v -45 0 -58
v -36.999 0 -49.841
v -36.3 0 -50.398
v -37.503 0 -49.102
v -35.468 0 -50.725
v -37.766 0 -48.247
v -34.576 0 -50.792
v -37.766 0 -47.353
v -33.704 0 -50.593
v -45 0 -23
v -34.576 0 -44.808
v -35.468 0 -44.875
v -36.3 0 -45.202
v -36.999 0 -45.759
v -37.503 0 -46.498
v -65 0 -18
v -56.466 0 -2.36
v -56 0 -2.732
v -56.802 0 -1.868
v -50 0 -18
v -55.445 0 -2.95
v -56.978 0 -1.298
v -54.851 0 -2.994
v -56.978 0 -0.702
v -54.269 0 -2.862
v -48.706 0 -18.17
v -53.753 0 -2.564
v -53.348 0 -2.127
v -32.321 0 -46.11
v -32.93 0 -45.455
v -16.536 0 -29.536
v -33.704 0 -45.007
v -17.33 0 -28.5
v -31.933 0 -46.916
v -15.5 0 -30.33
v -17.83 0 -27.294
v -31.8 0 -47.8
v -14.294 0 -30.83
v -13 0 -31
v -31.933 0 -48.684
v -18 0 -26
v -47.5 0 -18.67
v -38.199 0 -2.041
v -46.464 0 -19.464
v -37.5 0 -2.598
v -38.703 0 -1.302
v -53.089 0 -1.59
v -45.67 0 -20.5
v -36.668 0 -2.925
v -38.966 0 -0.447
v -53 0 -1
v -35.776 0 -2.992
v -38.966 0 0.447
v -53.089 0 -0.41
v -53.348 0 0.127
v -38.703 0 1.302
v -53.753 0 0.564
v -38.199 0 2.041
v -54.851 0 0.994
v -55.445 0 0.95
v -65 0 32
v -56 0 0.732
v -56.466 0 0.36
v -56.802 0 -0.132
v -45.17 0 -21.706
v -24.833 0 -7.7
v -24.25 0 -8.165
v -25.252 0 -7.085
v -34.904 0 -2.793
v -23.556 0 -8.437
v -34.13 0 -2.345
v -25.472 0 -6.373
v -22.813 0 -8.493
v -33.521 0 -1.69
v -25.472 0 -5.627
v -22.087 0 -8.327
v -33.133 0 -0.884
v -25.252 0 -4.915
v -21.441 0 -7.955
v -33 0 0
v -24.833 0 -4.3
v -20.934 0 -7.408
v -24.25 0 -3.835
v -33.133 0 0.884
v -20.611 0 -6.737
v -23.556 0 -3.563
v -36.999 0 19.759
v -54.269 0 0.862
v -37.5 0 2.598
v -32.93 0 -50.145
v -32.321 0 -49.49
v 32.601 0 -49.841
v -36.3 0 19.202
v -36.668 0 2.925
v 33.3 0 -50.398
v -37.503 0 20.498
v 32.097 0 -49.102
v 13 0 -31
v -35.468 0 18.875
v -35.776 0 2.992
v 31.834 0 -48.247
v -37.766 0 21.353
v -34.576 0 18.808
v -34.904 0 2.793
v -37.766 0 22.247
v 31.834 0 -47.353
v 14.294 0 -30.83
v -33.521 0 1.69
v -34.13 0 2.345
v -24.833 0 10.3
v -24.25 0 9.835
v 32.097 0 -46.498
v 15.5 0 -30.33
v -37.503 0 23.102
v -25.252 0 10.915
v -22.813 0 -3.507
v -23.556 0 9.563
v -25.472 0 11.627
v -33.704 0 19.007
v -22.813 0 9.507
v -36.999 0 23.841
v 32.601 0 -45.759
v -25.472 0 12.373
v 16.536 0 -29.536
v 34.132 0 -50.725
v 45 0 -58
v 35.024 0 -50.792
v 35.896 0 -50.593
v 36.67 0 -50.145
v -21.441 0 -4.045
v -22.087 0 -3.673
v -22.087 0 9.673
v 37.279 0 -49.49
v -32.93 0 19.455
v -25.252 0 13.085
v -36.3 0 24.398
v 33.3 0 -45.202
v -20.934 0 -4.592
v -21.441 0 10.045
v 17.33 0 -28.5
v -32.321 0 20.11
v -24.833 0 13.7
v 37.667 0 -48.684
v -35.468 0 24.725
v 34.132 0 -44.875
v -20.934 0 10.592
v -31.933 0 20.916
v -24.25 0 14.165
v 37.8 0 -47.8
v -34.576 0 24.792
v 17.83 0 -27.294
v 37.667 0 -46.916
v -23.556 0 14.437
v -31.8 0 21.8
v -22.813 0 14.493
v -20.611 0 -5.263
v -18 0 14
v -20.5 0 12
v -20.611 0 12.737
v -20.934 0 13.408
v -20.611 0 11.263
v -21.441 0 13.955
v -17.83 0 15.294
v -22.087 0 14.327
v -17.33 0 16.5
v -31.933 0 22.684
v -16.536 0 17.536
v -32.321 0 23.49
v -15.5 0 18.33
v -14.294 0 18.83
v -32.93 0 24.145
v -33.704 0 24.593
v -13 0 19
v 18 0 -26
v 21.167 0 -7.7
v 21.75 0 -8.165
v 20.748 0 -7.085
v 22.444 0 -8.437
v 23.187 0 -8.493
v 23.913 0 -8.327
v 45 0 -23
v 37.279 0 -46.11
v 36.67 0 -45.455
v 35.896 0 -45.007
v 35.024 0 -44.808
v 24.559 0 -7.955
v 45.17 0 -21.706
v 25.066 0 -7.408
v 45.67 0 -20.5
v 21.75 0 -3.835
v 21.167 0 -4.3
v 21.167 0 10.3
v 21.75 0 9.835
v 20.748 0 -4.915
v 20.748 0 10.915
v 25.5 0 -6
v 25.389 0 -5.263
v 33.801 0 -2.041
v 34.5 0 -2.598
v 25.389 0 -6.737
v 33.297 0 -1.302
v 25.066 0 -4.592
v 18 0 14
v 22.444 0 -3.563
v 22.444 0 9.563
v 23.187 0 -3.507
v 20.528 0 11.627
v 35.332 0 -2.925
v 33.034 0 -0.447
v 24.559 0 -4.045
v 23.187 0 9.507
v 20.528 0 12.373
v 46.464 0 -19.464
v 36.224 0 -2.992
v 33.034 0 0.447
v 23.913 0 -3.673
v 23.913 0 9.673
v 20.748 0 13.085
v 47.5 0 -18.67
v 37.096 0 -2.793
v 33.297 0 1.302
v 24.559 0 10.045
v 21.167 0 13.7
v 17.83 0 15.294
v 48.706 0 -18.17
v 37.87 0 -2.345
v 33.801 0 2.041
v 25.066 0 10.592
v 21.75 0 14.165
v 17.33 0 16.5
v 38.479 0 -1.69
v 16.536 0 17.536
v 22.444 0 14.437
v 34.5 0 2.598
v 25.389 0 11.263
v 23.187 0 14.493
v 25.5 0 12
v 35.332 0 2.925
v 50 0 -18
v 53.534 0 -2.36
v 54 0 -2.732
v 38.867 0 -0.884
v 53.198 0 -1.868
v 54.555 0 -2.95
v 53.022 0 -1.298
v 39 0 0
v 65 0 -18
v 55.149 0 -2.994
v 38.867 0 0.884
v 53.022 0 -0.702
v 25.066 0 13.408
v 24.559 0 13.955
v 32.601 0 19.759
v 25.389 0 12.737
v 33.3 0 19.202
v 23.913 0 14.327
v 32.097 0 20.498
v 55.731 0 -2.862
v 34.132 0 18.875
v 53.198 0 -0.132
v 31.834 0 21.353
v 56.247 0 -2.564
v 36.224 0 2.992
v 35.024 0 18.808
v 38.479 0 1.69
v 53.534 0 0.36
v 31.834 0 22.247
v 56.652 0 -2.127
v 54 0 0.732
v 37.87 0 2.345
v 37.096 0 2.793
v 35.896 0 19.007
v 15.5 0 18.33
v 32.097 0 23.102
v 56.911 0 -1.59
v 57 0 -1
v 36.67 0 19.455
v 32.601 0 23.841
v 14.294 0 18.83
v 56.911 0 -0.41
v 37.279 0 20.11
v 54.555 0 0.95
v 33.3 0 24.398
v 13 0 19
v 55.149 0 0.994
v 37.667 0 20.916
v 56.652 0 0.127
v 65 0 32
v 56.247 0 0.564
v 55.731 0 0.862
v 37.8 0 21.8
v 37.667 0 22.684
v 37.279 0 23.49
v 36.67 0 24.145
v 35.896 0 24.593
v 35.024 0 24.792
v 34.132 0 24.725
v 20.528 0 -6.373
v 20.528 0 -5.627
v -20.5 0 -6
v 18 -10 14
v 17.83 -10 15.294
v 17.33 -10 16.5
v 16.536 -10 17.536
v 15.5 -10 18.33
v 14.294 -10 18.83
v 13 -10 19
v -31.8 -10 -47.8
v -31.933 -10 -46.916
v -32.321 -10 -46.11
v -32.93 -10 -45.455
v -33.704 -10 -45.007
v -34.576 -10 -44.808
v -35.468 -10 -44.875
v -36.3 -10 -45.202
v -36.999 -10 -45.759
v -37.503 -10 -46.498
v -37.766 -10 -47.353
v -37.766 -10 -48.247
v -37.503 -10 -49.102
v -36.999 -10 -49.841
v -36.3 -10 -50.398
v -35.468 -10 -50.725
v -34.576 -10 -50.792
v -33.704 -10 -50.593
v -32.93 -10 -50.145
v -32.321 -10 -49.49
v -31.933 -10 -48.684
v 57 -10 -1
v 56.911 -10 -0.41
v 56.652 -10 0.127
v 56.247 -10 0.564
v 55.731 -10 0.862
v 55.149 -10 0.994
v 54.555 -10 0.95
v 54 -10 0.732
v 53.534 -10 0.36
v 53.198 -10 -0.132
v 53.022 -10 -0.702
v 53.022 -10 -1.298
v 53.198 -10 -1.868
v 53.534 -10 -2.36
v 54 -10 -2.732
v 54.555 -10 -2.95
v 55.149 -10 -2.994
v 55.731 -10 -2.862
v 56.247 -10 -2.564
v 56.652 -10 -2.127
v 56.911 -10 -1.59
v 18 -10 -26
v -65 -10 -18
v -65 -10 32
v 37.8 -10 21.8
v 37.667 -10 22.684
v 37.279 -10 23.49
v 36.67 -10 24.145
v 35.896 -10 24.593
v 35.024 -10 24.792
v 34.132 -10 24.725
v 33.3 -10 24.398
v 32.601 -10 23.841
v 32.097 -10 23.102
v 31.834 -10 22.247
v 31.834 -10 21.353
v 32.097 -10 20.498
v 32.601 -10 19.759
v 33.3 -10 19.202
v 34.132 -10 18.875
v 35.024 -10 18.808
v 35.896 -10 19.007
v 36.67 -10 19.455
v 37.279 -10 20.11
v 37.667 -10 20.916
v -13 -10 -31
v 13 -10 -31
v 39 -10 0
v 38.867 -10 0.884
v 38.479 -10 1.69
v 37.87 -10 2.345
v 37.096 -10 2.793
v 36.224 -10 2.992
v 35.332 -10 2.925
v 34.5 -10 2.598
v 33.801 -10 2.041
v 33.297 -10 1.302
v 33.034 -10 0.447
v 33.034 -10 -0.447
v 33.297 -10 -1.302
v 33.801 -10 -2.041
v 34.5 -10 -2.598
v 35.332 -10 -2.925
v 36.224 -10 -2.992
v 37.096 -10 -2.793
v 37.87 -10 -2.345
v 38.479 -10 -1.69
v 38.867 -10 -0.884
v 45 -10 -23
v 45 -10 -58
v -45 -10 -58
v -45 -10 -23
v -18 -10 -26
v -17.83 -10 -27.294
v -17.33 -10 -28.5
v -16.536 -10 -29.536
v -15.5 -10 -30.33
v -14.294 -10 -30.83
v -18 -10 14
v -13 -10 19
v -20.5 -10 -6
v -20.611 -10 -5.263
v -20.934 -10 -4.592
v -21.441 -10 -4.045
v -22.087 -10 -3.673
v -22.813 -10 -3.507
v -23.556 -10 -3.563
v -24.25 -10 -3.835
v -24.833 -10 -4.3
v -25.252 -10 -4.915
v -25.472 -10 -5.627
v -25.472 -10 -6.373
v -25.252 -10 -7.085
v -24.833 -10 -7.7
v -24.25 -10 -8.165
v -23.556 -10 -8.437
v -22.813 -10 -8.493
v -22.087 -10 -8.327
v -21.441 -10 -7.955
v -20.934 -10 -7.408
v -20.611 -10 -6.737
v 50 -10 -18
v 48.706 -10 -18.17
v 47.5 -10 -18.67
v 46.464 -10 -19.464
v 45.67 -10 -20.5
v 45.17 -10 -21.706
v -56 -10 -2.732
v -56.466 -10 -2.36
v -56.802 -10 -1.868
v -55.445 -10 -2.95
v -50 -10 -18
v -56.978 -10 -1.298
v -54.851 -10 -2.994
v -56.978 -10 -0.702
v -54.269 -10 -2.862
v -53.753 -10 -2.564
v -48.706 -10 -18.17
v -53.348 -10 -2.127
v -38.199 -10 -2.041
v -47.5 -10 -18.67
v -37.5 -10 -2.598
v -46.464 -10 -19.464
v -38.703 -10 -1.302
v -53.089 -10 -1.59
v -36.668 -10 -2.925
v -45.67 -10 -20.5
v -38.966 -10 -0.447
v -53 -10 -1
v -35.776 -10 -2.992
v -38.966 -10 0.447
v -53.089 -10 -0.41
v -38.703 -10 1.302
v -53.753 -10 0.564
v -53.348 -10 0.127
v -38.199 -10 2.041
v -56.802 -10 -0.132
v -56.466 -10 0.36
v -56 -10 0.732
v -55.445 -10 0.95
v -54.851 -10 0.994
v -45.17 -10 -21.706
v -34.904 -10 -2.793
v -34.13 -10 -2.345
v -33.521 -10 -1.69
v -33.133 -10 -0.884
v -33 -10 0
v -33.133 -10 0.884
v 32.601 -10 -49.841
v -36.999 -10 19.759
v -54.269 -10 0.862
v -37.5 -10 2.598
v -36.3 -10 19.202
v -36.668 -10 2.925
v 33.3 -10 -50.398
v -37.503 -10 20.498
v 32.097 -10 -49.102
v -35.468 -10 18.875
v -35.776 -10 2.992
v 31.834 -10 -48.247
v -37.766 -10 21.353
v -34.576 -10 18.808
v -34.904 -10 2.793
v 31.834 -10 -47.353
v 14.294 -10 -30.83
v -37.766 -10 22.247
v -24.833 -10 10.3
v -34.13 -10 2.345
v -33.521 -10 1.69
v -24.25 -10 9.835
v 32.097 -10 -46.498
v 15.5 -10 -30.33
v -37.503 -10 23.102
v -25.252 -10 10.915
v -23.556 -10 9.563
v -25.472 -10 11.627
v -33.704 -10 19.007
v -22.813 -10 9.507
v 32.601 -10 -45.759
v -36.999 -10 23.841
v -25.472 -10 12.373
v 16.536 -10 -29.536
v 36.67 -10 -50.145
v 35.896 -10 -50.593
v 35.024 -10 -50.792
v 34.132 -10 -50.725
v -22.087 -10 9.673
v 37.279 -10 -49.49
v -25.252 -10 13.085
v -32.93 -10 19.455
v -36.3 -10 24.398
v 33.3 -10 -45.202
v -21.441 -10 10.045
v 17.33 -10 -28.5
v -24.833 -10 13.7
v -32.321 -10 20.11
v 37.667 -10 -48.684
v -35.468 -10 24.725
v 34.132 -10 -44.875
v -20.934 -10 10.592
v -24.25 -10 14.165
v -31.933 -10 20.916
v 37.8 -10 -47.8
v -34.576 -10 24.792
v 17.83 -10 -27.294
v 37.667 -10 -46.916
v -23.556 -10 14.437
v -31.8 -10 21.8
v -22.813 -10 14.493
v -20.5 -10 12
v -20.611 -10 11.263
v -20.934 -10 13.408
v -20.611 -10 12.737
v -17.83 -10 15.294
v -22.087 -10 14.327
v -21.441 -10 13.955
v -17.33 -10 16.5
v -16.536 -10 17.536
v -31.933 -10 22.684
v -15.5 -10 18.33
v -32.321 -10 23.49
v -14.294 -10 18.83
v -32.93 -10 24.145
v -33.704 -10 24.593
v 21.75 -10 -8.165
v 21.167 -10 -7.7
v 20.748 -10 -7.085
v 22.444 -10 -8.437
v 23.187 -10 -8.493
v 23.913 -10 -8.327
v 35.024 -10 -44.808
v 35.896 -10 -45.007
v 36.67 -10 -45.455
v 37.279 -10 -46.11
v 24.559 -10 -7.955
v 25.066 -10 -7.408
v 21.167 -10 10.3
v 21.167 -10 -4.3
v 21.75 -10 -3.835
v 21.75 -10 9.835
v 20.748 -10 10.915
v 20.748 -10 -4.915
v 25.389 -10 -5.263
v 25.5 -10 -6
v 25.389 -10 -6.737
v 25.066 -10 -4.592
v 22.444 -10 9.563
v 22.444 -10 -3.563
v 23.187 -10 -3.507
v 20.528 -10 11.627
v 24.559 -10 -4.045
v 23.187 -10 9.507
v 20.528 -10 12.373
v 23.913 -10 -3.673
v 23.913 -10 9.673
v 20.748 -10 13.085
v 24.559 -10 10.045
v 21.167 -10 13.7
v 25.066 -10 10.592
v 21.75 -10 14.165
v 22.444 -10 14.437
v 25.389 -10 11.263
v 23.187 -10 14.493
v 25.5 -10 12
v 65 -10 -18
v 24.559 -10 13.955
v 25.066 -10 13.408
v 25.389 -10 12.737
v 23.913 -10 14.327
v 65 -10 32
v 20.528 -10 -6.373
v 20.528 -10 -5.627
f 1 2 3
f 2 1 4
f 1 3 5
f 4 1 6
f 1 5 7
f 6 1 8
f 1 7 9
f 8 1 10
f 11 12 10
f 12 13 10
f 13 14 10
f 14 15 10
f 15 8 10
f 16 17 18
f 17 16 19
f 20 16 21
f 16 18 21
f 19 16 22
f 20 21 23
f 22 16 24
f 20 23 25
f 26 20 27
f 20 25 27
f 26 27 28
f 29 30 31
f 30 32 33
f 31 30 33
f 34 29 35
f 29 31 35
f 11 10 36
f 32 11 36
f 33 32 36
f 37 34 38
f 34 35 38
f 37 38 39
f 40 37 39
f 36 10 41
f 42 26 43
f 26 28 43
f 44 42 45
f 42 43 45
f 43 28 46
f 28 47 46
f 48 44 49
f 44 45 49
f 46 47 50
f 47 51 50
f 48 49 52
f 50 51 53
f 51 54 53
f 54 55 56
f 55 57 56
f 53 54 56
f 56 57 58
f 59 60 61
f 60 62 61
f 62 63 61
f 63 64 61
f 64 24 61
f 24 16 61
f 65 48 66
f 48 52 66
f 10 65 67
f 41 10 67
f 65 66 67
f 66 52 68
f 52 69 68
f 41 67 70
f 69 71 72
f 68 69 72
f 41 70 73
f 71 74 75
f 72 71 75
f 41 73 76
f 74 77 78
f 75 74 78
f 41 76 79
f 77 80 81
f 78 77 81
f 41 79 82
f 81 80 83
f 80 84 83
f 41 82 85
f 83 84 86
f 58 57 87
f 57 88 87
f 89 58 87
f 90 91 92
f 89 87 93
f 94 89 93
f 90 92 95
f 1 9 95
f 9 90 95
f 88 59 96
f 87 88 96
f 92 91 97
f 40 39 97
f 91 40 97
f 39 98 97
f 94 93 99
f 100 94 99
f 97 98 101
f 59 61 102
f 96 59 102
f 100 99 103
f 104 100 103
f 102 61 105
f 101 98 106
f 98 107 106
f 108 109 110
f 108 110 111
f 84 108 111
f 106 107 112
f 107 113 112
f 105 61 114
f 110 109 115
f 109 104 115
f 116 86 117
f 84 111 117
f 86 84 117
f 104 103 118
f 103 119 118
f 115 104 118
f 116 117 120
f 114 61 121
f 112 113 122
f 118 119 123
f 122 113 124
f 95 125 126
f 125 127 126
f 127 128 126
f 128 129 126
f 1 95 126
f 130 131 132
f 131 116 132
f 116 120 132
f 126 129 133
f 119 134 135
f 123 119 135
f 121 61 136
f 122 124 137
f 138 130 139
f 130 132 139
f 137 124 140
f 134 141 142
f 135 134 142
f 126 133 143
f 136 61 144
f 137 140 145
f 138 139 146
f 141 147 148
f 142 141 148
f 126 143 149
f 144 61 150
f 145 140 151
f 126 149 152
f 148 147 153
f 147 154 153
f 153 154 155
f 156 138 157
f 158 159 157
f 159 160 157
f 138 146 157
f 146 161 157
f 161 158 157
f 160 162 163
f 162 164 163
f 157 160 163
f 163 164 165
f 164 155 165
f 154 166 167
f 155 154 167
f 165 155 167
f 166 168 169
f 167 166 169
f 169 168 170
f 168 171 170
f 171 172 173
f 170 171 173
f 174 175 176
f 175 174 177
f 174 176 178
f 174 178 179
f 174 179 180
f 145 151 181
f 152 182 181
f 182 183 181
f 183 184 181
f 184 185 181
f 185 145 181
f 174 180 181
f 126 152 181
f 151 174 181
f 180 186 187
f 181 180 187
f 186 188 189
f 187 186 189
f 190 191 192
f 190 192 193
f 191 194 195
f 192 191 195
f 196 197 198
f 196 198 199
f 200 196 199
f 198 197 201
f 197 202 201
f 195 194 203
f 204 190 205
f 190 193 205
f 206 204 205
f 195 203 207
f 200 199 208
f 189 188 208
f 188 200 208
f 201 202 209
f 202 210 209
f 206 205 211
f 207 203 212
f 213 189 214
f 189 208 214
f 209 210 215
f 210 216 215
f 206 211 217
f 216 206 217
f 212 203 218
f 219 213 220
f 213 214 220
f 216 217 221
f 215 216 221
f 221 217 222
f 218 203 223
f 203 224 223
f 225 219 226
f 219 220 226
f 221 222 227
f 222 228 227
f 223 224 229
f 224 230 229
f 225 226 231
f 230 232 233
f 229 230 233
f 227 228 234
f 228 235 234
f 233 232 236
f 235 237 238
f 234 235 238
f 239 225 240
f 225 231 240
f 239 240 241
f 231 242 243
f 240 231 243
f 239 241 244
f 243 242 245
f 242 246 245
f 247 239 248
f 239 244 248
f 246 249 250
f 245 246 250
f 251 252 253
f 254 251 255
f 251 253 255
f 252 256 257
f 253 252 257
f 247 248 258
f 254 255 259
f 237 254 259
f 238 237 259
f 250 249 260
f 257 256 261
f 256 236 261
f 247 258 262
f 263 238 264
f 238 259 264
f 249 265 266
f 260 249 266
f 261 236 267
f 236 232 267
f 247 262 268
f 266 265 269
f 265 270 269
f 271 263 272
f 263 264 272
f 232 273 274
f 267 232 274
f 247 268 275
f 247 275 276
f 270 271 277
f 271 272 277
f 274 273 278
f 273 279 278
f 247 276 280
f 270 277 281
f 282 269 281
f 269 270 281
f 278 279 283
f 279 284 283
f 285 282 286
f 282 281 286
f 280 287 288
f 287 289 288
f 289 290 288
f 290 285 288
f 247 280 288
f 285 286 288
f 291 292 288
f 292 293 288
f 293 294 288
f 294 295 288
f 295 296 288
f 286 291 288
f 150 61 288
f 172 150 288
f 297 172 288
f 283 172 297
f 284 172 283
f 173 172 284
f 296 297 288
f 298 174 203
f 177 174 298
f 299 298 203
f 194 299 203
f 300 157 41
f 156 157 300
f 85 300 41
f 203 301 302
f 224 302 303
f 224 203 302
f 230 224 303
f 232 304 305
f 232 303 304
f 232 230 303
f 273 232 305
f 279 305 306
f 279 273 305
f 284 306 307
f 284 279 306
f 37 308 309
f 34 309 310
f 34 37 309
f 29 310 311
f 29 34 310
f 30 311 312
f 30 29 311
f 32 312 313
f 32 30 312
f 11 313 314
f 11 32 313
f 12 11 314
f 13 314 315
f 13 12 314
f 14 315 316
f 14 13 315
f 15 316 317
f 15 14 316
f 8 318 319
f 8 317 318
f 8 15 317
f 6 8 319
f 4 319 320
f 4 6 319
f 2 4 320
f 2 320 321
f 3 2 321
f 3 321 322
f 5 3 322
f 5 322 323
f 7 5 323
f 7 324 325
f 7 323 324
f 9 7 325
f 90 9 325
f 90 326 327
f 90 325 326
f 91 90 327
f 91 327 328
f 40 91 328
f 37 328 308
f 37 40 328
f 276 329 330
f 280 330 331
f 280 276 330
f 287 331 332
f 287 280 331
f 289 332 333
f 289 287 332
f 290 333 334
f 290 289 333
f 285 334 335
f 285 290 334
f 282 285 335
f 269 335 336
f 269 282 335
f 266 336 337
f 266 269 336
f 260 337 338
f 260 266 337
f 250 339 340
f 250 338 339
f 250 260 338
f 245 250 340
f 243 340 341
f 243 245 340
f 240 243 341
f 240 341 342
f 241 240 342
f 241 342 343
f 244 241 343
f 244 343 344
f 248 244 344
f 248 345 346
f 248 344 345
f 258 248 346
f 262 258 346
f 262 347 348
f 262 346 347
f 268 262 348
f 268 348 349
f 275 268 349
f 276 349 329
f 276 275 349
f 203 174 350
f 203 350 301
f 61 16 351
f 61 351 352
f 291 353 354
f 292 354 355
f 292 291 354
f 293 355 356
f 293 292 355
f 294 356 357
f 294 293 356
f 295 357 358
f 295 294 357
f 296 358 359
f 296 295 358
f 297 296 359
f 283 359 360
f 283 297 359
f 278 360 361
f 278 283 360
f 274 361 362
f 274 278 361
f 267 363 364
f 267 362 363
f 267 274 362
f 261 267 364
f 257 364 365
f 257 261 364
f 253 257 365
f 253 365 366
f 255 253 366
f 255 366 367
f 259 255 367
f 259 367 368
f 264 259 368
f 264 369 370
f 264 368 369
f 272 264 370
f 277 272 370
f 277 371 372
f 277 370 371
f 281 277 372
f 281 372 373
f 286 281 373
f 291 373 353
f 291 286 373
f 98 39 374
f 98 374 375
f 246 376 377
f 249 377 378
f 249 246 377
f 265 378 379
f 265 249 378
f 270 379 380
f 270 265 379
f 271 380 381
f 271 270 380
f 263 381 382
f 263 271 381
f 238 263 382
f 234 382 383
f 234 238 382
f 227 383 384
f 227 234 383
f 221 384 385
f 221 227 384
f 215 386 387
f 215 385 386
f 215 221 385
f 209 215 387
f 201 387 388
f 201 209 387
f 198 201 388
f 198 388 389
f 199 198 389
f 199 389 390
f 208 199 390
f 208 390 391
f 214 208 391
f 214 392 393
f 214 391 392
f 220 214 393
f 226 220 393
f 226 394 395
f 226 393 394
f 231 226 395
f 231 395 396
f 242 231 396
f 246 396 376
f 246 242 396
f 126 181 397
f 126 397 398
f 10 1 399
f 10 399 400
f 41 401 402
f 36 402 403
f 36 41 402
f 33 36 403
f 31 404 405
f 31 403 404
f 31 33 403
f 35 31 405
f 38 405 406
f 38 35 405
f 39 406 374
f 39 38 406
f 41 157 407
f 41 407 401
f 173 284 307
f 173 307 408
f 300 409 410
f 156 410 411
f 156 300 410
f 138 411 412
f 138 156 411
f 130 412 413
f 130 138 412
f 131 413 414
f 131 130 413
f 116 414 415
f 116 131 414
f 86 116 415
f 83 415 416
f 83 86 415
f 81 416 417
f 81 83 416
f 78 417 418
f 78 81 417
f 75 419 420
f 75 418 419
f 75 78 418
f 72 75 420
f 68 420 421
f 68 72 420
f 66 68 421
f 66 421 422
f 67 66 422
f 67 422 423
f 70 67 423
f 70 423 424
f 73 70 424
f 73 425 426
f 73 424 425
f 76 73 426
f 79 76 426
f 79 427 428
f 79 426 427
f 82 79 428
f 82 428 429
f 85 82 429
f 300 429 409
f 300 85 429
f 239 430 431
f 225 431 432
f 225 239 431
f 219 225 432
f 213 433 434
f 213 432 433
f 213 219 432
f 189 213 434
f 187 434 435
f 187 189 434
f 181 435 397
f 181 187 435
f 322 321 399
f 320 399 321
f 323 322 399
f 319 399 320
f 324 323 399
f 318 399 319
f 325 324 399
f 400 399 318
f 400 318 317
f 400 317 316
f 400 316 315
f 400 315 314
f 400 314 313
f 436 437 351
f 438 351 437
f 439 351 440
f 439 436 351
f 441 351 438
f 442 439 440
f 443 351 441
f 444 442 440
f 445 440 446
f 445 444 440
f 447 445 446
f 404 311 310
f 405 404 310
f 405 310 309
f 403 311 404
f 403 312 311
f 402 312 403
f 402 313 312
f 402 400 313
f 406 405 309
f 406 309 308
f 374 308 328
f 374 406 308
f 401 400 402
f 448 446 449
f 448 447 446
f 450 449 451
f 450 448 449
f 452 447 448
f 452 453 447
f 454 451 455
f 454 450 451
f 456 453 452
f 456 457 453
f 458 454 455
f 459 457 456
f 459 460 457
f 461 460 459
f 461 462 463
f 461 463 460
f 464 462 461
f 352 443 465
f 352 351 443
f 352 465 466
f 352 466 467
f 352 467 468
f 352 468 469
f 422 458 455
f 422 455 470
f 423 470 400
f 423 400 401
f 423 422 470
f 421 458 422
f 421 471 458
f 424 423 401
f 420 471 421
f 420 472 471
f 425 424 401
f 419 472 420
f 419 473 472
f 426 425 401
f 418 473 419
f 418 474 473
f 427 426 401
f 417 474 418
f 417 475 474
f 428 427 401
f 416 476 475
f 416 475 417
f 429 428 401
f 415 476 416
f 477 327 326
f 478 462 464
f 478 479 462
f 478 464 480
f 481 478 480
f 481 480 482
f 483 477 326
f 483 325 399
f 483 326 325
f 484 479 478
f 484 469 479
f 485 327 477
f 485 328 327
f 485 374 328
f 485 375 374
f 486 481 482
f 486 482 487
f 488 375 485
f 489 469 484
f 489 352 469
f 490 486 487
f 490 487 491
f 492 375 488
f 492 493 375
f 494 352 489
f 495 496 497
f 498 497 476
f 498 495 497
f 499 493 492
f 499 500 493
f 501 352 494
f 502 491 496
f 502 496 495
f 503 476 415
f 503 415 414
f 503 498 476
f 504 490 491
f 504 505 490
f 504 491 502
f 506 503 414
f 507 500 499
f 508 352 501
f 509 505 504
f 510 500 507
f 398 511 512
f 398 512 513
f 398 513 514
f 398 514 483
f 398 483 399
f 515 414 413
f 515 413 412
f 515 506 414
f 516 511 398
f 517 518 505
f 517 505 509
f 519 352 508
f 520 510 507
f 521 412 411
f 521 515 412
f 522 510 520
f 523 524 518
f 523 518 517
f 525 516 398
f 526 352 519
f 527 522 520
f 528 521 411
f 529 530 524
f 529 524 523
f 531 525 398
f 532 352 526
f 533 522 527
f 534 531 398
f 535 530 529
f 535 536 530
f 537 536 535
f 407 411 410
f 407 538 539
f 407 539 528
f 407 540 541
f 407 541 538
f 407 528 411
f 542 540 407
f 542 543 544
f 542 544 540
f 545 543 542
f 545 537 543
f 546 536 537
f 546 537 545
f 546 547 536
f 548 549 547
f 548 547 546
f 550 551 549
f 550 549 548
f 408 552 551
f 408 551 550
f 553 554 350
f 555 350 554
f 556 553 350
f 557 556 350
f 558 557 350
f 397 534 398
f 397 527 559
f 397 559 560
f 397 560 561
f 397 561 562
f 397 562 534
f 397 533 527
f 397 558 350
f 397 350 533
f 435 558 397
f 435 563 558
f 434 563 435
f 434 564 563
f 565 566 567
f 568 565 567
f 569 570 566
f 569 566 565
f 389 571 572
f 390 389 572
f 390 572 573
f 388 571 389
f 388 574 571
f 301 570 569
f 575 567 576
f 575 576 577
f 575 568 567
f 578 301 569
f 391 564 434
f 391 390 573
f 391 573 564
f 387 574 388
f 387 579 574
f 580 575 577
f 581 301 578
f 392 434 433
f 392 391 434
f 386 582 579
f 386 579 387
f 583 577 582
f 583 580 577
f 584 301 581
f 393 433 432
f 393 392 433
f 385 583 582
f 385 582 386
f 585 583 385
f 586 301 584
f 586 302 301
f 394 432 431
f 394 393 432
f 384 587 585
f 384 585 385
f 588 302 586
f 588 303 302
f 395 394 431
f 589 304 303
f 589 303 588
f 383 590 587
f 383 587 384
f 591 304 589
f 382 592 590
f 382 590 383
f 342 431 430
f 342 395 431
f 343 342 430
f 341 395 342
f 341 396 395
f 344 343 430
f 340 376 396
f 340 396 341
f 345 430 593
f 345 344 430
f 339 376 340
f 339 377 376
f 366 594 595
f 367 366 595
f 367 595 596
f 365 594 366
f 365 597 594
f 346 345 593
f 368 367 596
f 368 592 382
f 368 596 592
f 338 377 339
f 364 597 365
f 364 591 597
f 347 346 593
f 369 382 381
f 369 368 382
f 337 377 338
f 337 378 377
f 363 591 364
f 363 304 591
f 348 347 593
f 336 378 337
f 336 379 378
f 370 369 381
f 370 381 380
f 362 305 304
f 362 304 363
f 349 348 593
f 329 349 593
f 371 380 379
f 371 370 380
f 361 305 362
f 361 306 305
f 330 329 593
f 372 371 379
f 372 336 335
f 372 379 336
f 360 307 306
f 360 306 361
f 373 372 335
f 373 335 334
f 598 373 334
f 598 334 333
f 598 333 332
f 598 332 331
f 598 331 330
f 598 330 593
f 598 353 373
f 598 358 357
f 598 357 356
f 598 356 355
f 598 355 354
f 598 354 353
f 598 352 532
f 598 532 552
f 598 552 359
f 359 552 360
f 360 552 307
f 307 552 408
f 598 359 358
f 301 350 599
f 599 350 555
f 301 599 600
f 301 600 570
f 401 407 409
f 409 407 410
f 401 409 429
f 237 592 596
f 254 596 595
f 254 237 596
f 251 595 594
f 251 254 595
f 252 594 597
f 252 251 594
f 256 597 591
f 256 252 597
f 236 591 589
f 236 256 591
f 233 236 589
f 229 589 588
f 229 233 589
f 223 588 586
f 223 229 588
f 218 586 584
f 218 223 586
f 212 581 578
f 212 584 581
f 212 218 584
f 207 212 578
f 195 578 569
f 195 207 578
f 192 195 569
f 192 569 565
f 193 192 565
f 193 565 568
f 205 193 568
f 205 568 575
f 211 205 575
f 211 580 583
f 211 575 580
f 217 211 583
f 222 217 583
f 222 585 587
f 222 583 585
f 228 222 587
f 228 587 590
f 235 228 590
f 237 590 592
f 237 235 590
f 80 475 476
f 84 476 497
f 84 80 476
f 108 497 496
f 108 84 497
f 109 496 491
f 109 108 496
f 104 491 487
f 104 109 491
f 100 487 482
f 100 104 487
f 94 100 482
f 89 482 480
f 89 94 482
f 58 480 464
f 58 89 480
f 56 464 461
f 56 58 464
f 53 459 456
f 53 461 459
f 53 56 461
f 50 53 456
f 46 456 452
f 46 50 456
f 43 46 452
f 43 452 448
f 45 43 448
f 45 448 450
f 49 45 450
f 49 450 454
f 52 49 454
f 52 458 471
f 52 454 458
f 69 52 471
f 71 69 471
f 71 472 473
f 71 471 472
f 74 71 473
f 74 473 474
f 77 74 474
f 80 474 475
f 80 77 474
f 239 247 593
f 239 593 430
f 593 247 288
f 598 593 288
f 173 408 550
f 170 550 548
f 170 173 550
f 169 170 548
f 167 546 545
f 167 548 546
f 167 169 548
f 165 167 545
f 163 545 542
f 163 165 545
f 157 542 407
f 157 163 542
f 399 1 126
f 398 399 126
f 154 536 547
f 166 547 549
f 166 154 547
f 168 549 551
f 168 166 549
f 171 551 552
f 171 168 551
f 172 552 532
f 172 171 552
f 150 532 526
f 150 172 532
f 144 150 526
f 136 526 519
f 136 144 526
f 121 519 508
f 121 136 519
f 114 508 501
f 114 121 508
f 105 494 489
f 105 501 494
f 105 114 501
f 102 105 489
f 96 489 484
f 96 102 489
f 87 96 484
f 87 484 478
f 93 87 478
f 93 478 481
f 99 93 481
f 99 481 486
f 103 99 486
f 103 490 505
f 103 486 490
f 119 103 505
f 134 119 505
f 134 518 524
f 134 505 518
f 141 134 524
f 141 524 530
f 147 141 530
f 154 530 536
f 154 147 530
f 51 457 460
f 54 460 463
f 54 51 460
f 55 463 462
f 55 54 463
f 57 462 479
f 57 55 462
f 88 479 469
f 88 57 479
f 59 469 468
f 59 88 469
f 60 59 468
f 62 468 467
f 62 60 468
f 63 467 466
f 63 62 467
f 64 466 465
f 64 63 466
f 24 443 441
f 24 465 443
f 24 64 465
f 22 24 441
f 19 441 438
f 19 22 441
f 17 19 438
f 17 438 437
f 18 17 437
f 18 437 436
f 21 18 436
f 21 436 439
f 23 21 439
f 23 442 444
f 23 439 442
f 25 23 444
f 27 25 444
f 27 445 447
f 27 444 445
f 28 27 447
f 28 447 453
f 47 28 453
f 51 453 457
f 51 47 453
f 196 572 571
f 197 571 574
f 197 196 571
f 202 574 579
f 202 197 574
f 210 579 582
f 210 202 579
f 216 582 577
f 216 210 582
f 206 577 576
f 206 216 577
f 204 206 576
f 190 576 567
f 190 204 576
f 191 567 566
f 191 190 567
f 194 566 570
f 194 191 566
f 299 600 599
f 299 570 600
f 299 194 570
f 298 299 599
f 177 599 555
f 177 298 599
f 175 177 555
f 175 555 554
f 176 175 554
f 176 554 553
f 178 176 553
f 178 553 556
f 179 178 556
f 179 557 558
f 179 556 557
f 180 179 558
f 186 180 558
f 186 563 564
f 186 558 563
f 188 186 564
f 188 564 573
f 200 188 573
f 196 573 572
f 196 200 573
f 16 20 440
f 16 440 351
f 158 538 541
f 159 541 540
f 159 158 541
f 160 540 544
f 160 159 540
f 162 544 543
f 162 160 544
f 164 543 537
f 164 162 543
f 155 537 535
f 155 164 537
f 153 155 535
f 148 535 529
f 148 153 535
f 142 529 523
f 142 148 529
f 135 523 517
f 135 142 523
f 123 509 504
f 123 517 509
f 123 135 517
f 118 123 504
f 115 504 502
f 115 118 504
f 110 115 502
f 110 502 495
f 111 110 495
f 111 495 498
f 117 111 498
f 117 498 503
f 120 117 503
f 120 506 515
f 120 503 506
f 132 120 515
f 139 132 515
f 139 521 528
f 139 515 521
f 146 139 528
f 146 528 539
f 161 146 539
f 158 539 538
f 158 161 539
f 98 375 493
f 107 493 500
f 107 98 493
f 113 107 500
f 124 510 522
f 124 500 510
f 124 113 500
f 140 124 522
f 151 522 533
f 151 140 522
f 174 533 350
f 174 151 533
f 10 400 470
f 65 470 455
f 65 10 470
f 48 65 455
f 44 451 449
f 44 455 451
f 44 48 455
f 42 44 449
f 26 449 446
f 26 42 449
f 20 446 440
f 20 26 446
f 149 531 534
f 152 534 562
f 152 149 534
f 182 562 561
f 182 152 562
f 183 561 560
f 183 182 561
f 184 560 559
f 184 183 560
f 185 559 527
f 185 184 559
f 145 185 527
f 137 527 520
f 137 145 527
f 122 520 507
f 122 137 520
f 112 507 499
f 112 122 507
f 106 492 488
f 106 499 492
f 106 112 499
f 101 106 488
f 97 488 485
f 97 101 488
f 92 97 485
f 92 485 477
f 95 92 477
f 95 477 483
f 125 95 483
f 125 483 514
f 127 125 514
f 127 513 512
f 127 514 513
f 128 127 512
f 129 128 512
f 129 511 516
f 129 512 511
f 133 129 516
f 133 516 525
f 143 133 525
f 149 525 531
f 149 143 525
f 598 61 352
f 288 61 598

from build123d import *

# Parameters (mm, degrees)
F1_W     = 130
F1_H     = 90
F3_DEPTH = 10
F2_R     = 2.5
F4_DEPTH = 10.001
F0_R     = 3
F0_R_2   = 2
F5_DEPTH = 10.001
F6_R     = 3
F7_DEPTH = 10.001
F9_DEPTH = 10.001


with BuildPart() as f3:
    # F1 (on Front) → F3 (new body)
    with BuildSketch(Plane.XZ):
        with Locations((0, -13)):
            Rectangle(F1_W, F1_H)
    extrude(amount=F3_DEPTH)

    # F2 (on Front) → F4 (cut, through all)
    with BuildSketch(Plane.XZ):
        with Locations((23, -6)):
            Circle(F2_R)
        with Locations((23, 12)):
            Circle(F2_R)
        with Locations((-23, -6)):
            Circle(F2_R)
        with Locations((-23, 12)):
            Circle(F2_R)
    extrude(amount=F4_DEPTH, mode=Mode.SUBTRACT)

    # F0 (on Front) → F5 (cut, through all)
    with BuildSketch(Plane.XZ):
        with Locations((-36, 0)):
            Circle(F0_R)
        with Locations((36, 0)):
            Circle(F0_R)
        with Locations((-55, -1)):
            Circle(F0_R_2)
        with Locations((55, -1)):
            Circle(F0_R_2)
        with BuildLine():
            ThreePointArc((18, 14), (16.535534, 17.535534), (13, 19))
            Line((13, 19), (-13, 19))
            ThreePointArc((-13, 19), (-16.535534, 17.535534), (-18, 14))
            Line((-18, 14), (-18, -26))
            ThreePointArc((-18, -26), (-16.535534, -29.535534), (-13, -31))
            Line((-13, -31), (13, -31))
            ThreePointArc((13, -31), (16.535534, -29.535534), (18, -26))
            Line((18, -26), (18, 14))
        make_face()
    extrude(amount=F5_DEPTH, mode=Mode.SUBTRACT)

    # F6 (on Front) → F7 (cut, through all)
    with BuildSketch(Plane.XZ):
        with Locations((34.8, -47.8)):
            Circle(F6_R)
        with Locations((34.8, 21.8)):
            Circle(F6_R)
        with Locations((-34.8, -47.8)):
            Circle(F6_R)
        with Locations((-34.8, 21.8)):
            Circle(F6_R)
    extrude(amount=F7_DEPTH, mode=Mode.SUBTRACT)

    # F8 (on Front) → F9 (cut, through all)
    with BuildSketch(Plane.XZ):
        with BuildLine():
            Line((-65, -18), (-65, -58))
            Line((-65, -58), (-45, -58))
            Line((-45, -58), (-45, -23))
            ThreePointArc((-45, -23), (-46.464466, -19.464466), (-50, -18))
            Line((-50, -18), (-65, -18))
        make_face()
        with BuildLine():
            Line((45, -58), (65, -58))
            Line((65, -58), (65, -18))
            Line((65, -18), (50, -18))
            ThreePointArc((50, -18), (46.464466, -19.464466), (45, -23))
            Line((45, -23), (45, -58))
        make_face()
    extrude(amount=F9_DEPTH, mode=Mode.SUBTRACT)


solid = f3.part
